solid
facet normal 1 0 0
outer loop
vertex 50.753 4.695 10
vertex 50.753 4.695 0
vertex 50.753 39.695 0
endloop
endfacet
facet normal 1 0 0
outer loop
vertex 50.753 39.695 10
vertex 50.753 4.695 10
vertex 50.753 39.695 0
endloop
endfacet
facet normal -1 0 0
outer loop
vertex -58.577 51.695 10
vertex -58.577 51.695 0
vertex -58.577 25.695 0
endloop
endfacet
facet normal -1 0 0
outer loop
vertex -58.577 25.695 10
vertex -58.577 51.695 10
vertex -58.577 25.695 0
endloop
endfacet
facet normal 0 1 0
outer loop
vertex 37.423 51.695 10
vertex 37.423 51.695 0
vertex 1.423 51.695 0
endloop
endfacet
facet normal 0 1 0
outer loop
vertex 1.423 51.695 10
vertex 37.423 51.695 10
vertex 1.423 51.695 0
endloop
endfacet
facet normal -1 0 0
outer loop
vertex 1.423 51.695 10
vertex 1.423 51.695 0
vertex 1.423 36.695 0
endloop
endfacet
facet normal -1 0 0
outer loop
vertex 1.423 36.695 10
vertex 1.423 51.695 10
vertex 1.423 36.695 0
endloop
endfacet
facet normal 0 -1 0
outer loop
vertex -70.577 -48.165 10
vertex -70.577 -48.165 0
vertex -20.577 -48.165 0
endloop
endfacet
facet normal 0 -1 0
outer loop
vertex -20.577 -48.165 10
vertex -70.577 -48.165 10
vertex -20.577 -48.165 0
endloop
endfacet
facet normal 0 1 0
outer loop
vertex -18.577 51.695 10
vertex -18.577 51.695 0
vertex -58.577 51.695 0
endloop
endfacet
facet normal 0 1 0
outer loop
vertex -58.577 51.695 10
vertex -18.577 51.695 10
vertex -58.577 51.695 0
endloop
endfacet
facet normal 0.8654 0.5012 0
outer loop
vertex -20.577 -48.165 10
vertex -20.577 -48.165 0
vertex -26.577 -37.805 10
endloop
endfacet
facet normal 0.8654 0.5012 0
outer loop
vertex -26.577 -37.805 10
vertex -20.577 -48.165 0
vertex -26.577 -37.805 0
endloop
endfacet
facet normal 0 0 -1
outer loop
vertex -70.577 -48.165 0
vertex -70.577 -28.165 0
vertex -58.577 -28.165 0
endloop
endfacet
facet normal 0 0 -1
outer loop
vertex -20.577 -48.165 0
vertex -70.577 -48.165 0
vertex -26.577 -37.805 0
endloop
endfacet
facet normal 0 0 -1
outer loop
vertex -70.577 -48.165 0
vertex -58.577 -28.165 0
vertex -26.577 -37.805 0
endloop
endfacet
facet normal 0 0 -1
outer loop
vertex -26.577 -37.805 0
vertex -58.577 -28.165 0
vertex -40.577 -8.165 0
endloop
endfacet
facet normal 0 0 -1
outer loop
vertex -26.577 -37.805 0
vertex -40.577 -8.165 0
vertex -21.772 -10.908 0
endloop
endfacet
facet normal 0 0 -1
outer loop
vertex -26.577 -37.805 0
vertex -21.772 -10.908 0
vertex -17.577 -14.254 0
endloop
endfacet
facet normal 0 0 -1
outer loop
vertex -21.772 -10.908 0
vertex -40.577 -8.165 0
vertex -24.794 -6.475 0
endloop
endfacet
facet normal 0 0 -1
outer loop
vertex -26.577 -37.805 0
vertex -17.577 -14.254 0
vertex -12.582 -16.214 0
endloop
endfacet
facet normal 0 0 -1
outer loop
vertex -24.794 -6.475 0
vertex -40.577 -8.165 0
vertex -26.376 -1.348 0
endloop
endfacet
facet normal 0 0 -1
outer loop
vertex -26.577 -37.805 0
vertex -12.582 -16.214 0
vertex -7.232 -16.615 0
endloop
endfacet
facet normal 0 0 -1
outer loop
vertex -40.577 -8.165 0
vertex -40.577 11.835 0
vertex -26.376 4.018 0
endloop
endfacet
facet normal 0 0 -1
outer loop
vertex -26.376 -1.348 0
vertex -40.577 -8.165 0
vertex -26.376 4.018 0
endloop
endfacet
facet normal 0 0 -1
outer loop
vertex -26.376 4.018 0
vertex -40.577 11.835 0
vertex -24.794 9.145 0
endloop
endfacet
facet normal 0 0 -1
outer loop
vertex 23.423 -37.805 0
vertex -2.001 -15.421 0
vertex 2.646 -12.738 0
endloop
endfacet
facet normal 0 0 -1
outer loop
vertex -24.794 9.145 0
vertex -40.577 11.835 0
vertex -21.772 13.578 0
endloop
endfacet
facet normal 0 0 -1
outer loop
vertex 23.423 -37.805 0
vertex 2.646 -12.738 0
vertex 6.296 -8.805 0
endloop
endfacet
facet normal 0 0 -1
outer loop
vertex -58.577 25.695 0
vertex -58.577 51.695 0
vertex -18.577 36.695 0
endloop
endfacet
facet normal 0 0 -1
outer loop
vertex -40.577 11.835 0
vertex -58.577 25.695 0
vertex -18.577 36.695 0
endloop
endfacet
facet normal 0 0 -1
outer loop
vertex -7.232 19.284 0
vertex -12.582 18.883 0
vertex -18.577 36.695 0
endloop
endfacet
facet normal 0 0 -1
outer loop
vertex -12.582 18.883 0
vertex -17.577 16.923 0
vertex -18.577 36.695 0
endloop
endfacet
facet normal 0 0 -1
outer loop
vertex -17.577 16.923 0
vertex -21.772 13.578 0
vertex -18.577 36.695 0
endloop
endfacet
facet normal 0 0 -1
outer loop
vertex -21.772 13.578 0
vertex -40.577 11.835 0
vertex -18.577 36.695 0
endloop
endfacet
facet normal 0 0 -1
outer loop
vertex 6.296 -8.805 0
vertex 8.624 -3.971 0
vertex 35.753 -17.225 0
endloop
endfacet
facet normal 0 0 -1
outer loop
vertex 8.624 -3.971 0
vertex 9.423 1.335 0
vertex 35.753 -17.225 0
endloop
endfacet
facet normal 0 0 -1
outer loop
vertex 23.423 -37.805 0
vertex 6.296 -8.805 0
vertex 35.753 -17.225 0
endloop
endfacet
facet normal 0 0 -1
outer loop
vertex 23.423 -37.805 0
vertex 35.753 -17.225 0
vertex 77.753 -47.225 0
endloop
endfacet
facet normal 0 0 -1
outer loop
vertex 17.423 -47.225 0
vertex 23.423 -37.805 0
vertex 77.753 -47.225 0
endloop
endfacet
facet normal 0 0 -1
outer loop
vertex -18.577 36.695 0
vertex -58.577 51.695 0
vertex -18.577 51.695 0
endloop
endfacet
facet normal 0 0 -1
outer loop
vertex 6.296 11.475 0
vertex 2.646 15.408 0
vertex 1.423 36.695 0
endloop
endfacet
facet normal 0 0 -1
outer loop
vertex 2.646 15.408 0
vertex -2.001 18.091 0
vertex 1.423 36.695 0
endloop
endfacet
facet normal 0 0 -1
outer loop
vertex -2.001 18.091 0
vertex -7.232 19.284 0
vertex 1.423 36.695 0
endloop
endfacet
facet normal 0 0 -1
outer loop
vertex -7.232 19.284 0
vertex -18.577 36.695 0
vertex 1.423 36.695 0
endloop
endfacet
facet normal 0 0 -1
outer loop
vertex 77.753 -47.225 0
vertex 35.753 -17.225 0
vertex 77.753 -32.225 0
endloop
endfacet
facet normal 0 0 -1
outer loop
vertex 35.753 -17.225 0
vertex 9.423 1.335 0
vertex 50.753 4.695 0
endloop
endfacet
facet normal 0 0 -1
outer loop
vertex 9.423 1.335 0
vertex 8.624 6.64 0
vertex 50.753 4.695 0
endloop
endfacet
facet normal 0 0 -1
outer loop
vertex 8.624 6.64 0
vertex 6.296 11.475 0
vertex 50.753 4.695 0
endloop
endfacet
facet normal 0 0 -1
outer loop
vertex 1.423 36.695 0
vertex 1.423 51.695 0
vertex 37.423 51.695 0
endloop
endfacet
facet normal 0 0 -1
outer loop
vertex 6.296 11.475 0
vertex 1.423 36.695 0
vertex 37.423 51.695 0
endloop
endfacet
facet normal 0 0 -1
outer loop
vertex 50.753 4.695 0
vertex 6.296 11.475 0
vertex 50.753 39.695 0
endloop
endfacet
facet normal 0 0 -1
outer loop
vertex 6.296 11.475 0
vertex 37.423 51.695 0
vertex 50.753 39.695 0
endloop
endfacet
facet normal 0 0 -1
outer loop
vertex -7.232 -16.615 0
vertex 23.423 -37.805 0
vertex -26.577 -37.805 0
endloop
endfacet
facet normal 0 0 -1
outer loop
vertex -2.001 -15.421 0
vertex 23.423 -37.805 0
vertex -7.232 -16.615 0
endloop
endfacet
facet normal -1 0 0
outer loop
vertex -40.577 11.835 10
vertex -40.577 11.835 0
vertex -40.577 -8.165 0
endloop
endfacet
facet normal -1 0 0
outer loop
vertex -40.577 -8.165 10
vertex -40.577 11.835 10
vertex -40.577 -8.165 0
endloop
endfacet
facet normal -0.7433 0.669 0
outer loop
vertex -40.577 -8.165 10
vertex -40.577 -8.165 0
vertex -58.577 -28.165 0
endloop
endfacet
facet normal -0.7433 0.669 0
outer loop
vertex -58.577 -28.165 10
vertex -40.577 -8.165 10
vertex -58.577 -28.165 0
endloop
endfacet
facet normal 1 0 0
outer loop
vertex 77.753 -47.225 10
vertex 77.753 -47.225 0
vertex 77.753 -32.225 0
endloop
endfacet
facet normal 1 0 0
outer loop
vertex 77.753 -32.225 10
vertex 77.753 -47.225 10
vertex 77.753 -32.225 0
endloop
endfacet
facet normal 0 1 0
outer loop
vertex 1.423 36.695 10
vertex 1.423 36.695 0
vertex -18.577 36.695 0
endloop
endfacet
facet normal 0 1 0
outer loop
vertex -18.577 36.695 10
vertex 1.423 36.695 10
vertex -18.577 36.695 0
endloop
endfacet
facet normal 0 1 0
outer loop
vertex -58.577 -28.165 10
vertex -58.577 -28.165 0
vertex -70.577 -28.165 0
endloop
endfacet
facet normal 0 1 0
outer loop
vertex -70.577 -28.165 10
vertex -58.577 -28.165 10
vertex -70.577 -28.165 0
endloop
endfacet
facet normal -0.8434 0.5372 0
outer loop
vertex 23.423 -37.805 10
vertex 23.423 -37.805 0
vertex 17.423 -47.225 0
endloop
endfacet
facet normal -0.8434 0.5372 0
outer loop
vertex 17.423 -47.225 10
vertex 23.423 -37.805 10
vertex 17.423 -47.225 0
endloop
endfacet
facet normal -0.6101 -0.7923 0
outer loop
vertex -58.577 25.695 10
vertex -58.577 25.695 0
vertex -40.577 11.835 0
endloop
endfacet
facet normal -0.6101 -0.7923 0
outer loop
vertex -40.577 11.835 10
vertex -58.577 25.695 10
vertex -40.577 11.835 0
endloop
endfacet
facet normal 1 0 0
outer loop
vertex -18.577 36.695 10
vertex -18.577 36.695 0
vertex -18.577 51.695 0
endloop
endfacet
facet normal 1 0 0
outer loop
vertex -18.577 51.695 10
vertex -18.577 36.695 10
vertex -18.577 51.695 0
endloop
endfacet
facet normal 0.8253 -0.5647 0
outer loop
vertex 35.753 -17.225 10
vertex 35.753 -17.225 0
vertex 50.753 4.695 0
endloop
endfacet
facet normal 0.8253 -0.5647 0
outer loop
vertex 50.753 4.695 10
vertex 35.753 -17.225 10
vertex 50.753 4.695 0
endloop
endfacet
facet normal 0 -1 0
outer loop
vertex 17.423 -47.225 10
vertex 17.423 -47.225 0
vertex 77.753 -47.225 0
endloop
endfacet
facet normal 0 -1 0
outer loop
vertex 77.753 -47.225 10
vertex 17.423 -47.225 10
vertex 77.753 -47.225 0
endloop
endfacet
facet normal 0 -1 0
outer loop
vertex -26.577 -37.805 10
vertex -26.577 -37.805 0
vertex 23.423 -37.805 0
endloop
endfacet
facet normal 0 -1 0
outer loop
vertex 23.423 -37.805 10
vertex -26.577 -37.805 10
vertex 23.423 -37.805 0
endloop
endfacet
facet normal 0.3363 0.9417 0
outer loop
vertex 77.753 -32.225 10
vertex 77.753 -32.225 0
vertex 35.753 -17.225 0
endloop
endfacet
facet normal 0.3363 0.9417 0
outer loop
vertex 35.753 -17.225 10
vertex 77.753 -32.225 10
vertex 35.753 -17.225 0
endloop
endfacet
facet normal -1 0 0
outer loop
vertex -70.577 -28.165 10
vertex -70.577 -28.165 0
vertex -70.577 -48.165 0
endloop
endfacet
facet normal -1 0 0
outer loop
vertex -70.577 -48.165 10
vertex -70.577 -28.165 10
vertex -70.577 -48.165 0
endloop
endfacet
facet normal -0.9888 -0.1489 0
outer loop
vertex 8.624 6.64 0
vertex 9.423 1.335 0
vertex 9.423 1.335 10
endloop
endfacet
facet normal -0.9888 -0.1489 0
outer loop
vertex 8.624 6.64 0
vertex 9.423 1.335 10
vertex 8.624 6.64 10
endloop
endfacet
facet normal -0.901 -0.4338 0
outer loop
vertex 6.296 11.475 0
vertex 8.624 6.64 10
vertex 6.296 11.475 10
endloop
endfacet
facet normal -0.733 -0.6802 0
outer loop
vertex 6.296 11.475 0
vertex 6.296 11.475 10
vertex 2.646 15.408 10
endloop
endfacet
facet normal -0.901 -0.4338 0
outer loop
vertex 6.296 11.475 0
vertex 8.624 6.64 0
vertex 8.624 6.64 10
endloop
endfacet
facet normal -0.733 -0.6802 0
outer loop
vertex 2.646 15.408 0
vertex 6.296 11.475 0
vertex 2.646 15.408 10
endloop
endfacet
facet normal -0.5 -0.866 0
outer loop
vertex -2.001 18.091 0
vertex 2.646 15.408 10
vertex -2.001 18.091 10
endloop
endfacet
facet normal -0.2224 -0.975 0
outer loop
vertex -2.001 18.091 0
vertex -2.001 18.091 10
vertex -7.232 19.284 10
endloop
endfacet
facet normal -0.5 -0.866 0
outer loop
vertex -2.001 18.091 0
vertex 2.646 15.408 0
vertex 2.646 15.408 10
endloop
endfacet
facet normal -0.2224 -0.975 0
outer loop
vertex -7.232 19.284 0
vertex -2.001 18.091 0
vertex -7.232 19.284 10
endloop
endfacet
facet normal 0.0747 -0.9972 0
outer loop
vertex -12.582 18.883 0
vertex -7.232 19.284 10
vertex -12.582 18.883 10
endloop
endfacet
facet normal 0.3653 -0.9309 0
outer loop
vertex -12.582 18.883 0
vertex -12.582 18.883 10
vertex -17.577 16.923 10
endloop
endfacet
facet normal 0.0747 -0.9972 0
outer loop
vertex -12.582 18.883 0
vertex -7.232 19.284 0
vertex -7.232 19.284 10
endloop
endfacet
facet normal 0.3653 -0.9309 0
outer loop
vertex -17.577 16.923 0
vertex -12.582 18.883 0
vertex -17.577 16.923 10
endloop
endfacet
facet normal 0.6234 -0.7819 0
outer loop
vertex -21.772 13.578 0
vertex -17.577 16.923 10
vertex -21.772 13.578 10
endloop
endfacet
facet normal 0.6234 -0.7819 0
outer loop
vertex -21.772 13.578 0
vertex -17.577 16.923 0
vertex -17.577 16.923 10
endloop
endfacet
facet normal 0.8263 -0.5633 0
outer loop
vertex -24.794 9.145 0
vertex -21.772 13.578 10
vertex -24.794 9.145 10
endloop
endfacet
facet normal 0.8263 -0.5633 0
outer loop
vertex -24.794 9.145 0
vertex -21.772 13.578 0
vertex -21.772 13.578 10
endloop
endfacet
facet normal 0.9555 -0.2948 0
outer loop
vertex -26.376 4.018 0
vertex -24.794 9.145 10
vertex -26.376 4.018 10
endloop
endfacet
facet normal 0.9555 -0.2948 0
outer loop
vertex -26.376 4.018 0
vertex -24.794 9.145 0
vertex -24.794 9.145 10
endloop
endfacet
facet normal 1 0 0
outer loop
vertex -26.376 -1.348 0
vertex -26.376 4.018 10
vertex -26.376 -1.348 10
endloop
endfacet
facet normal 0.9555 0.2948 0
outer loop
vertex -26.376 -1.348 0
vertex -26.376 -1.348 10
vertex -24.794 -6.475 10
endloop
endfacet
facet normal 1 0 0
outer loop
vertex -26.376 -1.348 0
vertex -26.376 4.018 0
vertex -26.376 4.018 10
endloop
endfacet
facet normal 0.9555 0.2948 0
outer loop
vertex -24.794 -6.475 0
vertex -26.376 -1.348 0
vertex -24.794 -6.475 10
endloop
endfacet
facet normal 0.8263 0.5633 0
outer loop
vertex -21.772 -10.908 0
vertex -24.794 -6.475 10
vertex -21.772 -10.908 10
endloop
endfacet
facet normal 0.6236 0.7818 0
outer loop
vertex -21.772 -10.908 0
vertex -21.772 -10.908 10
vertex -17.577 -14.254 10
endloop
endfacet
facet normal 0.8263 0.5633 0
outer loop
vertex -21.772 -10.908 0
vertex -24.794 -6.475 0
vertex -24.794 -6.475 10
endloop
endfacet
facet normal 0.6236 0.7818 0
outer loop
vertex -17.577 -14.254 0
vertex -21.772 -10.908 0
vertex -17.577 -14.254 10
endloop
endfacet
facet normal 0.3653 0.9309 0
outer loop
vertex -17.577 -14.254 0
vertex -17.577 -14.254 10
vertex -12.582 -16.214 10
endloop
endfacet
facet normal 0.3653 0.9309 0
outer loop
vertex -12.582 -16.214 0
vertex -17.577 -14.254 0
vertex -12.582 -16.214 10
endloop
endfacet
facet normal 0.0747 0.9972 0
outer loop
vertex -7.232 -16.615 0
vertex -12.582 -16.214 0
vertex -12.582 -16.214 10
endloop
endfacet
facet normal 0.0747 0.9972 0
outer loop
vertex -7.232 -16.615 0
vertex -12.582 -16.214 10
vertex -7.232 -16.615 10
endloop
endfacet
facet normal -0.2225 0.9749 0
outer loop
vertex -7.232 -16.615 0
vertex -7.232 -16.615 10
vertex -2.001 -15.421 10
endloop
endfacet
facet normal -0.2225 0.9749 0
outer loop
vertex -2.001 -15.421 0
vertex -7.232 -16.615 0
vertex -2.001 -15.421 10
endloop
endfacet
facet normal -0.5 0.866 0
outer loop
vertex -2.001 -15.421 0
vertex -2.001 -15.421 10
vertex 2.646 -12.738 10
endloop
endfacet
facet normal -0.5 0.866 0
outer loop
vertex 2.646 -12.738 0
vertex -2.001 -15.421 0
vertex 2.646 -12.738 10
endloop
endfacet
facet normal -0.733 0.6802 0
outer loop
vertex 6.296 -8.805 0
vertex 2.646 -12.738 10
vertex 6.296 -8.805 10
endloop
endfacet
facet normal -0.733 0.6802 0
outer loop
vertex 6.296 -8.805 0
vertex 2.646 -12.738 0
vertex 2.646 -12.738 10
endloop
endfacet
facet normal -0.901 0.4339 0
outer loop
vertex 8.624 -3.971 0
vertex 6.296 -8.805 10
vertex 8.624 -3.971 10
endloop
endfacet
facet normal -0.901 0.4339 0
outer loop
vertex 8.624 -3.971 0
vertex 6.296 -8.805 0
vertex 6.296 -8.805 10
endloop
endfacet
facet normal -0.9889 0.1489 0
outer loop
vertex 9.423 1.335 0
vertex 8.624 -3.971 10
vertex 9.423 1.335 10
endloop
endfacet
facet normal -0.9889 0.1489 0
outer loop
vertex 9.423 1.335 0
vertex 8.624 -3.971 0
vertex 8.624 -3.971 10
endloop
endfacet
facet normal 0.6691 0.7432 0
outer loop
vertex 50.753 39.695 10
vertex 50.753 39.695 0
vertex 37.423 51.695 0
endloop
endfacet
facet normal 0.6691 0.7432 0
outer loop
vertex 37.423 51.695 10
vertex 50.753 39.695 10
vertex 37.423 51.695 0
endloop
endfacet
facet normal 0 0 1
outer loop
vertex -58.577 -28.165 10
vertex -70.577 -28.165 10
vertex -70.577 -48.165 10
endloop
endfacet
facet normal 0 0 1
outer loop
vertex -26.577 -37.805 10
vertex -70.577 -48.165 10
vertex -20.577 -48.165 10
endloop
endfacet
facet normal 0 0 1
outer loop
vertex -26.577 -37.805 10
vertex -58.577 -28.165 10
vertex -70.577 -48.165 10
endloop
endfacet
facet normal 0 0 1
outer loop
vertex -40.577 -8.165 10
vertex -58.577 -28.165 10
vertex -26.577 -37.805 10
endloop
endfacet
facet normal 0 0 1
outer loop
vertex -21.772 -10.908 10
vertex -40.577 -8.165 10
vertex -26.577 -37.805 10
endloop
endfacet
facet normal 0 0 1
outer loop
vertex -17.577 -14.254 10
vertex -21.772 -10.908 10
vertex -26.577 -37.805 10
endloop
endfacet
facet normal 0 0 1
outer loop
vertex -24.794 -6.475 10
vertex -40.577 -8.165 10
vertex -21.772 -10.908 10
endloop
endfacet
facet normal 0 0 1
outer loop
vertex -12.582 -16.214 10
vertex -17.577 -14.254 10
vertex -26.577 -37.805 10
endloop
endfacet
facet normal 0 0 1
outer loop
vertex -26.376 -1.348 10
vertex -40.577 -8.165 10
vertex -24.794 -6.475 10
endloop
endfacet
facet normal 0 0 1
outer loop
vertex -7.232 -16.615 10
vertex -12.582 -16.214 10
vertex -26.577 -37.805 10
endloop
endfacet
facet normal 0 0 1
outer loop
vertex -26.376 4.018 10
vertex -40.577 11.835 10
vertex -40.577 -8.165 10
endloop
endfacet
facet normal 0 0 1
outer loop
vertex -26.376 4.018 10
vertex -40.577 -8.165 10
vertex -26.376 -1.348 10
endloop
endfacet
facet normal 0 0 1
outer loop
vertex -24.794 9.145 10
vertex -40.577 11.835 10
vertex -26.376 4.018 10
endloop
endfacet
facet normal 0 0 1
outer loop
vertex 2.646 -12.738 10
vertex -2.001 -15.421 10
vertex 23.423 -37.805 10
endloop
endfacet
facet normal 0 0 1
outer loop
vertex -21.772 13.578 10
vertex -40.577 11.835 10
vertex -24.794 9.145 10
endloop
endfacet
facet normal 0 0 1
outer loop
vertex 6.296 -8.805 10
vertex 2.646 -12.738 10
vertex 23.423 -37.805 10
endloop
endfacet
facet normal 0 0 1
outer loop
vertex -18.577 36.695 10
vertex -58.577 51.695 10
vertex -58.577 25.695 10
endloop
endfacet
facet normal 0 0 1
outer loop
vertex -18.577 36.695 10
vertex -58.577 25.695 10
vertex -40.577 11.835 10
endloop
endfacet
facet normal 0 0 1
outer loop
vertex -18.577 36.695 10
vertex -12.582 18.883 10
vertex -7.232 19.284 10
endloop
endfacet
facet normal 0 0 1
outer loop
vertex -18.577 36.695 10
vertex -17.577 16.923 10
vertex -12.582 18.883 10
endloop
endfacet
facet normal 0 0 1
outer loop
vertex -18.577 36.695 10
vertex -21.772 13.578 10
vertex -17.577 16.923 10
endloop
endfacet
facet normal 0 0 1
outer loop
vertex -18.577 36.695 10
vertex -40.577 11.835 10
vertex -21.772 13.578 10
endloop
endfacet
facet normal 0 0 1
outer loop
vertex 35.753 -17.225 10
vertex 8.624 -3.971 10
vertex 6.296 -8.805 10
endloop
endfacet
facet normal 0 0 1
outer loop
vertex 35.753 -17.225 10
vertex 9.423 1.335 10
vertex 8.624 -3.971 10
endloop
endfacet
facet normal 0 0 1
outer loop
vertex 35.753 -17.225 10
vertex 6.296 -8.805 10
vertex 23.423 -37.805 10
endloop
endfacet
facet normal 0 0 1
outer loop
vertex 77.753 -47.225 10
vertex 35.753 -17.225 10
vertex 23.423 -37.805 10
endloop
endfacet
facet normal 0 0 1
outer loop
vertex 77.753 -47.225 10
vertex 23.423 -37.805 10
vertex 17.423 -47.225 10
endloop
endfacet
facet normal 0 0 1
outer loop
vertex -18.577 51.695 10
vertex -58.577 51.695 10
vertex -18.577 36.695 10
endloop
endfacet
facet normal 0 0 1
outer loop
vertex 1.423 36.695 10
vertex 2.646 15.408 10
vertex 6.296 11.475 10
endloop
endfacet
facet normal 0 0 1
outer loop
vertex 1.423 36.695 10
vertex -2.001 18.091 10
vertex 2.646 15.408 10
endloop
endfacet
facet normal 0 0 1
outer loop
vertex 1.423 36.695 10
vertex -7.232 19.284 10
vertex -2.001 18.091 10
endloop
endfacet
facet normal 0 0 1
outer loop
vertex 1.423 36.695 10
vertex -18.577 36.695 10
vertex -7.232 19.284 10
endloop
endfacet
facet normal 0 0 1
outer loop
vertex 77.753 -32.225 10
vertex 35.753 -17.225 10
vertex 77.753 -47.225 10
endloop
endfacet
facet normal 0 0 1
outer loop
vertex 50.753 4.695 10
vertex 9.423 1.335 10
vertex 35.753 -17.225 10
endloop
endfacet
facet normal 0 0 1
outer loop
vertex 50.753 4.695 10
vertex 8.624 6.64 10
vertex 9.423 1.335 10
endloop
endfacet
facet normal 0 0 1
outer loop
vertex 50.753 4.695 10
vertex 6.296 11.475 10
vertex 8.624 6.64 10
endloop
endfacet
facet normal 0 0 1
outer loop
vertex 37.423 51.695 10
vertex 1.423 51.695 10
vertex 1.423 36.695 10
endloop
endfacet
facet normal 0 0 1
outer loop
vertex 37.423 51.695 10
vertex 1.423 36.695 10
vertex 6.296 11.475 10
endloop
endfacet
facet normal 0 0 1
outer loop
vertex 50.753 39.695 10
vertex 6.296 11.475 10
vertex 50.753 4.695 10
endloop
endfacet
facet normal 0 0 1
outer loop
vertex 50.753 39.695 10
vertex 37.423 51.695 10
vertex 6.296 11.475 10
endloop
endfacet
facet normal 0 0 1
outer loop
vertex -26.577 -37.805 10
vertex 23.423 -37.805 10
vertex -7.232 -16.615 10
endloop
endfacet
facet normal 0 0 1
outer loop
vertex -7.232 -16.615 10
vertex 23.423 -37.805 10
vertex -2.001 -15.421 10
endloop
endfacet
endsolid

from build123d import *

# Parameters (mm, degrees)
SKETCH1_R           = 18
BOSS_EXTRUDE2_DEPTH = 10


with BuildPart() as part:
    # Sketch1 → Boss-Extrude2 (new body)
    with BuildSketch(Plane.XY):
        Polygon((17.423284477, -47.225403837), (77.753284477, -47.225403837), (77.753284477, -32.225403837), (35.753284477, -17.225403837), (50.753284477, 4.694596163), (50.753284477, 39.694596163), (37.423284477, 51.694596163), (1.423284477, 51.694596163), (1.423284477, 36.694596163), (-18.576715523, 36.694596163), (-18.576715523, 51.694596163), (-58.576715523, 51.694596163), (-58.576715523, 25.694596163), (-40.576715523, 11.834793389), (-40.576715523, -8.165206611), (-58.576715523, -28.165206611), (-70.576715523, -28.165206611), (-70.576715523, -48.165206611), (-20.576715523, -48.165206611), (-26.576715523, -37.805403837), (23.423284477, -37.805403837), align=None)
        with Locations((-8.576715523, 1.334793389)):
            Circle(SKETCH1_R, mode=Mode.SUBTRACT)
    extrude(amount=BOSS_EXTRUDE2_DEPTH)


solid = part.part
